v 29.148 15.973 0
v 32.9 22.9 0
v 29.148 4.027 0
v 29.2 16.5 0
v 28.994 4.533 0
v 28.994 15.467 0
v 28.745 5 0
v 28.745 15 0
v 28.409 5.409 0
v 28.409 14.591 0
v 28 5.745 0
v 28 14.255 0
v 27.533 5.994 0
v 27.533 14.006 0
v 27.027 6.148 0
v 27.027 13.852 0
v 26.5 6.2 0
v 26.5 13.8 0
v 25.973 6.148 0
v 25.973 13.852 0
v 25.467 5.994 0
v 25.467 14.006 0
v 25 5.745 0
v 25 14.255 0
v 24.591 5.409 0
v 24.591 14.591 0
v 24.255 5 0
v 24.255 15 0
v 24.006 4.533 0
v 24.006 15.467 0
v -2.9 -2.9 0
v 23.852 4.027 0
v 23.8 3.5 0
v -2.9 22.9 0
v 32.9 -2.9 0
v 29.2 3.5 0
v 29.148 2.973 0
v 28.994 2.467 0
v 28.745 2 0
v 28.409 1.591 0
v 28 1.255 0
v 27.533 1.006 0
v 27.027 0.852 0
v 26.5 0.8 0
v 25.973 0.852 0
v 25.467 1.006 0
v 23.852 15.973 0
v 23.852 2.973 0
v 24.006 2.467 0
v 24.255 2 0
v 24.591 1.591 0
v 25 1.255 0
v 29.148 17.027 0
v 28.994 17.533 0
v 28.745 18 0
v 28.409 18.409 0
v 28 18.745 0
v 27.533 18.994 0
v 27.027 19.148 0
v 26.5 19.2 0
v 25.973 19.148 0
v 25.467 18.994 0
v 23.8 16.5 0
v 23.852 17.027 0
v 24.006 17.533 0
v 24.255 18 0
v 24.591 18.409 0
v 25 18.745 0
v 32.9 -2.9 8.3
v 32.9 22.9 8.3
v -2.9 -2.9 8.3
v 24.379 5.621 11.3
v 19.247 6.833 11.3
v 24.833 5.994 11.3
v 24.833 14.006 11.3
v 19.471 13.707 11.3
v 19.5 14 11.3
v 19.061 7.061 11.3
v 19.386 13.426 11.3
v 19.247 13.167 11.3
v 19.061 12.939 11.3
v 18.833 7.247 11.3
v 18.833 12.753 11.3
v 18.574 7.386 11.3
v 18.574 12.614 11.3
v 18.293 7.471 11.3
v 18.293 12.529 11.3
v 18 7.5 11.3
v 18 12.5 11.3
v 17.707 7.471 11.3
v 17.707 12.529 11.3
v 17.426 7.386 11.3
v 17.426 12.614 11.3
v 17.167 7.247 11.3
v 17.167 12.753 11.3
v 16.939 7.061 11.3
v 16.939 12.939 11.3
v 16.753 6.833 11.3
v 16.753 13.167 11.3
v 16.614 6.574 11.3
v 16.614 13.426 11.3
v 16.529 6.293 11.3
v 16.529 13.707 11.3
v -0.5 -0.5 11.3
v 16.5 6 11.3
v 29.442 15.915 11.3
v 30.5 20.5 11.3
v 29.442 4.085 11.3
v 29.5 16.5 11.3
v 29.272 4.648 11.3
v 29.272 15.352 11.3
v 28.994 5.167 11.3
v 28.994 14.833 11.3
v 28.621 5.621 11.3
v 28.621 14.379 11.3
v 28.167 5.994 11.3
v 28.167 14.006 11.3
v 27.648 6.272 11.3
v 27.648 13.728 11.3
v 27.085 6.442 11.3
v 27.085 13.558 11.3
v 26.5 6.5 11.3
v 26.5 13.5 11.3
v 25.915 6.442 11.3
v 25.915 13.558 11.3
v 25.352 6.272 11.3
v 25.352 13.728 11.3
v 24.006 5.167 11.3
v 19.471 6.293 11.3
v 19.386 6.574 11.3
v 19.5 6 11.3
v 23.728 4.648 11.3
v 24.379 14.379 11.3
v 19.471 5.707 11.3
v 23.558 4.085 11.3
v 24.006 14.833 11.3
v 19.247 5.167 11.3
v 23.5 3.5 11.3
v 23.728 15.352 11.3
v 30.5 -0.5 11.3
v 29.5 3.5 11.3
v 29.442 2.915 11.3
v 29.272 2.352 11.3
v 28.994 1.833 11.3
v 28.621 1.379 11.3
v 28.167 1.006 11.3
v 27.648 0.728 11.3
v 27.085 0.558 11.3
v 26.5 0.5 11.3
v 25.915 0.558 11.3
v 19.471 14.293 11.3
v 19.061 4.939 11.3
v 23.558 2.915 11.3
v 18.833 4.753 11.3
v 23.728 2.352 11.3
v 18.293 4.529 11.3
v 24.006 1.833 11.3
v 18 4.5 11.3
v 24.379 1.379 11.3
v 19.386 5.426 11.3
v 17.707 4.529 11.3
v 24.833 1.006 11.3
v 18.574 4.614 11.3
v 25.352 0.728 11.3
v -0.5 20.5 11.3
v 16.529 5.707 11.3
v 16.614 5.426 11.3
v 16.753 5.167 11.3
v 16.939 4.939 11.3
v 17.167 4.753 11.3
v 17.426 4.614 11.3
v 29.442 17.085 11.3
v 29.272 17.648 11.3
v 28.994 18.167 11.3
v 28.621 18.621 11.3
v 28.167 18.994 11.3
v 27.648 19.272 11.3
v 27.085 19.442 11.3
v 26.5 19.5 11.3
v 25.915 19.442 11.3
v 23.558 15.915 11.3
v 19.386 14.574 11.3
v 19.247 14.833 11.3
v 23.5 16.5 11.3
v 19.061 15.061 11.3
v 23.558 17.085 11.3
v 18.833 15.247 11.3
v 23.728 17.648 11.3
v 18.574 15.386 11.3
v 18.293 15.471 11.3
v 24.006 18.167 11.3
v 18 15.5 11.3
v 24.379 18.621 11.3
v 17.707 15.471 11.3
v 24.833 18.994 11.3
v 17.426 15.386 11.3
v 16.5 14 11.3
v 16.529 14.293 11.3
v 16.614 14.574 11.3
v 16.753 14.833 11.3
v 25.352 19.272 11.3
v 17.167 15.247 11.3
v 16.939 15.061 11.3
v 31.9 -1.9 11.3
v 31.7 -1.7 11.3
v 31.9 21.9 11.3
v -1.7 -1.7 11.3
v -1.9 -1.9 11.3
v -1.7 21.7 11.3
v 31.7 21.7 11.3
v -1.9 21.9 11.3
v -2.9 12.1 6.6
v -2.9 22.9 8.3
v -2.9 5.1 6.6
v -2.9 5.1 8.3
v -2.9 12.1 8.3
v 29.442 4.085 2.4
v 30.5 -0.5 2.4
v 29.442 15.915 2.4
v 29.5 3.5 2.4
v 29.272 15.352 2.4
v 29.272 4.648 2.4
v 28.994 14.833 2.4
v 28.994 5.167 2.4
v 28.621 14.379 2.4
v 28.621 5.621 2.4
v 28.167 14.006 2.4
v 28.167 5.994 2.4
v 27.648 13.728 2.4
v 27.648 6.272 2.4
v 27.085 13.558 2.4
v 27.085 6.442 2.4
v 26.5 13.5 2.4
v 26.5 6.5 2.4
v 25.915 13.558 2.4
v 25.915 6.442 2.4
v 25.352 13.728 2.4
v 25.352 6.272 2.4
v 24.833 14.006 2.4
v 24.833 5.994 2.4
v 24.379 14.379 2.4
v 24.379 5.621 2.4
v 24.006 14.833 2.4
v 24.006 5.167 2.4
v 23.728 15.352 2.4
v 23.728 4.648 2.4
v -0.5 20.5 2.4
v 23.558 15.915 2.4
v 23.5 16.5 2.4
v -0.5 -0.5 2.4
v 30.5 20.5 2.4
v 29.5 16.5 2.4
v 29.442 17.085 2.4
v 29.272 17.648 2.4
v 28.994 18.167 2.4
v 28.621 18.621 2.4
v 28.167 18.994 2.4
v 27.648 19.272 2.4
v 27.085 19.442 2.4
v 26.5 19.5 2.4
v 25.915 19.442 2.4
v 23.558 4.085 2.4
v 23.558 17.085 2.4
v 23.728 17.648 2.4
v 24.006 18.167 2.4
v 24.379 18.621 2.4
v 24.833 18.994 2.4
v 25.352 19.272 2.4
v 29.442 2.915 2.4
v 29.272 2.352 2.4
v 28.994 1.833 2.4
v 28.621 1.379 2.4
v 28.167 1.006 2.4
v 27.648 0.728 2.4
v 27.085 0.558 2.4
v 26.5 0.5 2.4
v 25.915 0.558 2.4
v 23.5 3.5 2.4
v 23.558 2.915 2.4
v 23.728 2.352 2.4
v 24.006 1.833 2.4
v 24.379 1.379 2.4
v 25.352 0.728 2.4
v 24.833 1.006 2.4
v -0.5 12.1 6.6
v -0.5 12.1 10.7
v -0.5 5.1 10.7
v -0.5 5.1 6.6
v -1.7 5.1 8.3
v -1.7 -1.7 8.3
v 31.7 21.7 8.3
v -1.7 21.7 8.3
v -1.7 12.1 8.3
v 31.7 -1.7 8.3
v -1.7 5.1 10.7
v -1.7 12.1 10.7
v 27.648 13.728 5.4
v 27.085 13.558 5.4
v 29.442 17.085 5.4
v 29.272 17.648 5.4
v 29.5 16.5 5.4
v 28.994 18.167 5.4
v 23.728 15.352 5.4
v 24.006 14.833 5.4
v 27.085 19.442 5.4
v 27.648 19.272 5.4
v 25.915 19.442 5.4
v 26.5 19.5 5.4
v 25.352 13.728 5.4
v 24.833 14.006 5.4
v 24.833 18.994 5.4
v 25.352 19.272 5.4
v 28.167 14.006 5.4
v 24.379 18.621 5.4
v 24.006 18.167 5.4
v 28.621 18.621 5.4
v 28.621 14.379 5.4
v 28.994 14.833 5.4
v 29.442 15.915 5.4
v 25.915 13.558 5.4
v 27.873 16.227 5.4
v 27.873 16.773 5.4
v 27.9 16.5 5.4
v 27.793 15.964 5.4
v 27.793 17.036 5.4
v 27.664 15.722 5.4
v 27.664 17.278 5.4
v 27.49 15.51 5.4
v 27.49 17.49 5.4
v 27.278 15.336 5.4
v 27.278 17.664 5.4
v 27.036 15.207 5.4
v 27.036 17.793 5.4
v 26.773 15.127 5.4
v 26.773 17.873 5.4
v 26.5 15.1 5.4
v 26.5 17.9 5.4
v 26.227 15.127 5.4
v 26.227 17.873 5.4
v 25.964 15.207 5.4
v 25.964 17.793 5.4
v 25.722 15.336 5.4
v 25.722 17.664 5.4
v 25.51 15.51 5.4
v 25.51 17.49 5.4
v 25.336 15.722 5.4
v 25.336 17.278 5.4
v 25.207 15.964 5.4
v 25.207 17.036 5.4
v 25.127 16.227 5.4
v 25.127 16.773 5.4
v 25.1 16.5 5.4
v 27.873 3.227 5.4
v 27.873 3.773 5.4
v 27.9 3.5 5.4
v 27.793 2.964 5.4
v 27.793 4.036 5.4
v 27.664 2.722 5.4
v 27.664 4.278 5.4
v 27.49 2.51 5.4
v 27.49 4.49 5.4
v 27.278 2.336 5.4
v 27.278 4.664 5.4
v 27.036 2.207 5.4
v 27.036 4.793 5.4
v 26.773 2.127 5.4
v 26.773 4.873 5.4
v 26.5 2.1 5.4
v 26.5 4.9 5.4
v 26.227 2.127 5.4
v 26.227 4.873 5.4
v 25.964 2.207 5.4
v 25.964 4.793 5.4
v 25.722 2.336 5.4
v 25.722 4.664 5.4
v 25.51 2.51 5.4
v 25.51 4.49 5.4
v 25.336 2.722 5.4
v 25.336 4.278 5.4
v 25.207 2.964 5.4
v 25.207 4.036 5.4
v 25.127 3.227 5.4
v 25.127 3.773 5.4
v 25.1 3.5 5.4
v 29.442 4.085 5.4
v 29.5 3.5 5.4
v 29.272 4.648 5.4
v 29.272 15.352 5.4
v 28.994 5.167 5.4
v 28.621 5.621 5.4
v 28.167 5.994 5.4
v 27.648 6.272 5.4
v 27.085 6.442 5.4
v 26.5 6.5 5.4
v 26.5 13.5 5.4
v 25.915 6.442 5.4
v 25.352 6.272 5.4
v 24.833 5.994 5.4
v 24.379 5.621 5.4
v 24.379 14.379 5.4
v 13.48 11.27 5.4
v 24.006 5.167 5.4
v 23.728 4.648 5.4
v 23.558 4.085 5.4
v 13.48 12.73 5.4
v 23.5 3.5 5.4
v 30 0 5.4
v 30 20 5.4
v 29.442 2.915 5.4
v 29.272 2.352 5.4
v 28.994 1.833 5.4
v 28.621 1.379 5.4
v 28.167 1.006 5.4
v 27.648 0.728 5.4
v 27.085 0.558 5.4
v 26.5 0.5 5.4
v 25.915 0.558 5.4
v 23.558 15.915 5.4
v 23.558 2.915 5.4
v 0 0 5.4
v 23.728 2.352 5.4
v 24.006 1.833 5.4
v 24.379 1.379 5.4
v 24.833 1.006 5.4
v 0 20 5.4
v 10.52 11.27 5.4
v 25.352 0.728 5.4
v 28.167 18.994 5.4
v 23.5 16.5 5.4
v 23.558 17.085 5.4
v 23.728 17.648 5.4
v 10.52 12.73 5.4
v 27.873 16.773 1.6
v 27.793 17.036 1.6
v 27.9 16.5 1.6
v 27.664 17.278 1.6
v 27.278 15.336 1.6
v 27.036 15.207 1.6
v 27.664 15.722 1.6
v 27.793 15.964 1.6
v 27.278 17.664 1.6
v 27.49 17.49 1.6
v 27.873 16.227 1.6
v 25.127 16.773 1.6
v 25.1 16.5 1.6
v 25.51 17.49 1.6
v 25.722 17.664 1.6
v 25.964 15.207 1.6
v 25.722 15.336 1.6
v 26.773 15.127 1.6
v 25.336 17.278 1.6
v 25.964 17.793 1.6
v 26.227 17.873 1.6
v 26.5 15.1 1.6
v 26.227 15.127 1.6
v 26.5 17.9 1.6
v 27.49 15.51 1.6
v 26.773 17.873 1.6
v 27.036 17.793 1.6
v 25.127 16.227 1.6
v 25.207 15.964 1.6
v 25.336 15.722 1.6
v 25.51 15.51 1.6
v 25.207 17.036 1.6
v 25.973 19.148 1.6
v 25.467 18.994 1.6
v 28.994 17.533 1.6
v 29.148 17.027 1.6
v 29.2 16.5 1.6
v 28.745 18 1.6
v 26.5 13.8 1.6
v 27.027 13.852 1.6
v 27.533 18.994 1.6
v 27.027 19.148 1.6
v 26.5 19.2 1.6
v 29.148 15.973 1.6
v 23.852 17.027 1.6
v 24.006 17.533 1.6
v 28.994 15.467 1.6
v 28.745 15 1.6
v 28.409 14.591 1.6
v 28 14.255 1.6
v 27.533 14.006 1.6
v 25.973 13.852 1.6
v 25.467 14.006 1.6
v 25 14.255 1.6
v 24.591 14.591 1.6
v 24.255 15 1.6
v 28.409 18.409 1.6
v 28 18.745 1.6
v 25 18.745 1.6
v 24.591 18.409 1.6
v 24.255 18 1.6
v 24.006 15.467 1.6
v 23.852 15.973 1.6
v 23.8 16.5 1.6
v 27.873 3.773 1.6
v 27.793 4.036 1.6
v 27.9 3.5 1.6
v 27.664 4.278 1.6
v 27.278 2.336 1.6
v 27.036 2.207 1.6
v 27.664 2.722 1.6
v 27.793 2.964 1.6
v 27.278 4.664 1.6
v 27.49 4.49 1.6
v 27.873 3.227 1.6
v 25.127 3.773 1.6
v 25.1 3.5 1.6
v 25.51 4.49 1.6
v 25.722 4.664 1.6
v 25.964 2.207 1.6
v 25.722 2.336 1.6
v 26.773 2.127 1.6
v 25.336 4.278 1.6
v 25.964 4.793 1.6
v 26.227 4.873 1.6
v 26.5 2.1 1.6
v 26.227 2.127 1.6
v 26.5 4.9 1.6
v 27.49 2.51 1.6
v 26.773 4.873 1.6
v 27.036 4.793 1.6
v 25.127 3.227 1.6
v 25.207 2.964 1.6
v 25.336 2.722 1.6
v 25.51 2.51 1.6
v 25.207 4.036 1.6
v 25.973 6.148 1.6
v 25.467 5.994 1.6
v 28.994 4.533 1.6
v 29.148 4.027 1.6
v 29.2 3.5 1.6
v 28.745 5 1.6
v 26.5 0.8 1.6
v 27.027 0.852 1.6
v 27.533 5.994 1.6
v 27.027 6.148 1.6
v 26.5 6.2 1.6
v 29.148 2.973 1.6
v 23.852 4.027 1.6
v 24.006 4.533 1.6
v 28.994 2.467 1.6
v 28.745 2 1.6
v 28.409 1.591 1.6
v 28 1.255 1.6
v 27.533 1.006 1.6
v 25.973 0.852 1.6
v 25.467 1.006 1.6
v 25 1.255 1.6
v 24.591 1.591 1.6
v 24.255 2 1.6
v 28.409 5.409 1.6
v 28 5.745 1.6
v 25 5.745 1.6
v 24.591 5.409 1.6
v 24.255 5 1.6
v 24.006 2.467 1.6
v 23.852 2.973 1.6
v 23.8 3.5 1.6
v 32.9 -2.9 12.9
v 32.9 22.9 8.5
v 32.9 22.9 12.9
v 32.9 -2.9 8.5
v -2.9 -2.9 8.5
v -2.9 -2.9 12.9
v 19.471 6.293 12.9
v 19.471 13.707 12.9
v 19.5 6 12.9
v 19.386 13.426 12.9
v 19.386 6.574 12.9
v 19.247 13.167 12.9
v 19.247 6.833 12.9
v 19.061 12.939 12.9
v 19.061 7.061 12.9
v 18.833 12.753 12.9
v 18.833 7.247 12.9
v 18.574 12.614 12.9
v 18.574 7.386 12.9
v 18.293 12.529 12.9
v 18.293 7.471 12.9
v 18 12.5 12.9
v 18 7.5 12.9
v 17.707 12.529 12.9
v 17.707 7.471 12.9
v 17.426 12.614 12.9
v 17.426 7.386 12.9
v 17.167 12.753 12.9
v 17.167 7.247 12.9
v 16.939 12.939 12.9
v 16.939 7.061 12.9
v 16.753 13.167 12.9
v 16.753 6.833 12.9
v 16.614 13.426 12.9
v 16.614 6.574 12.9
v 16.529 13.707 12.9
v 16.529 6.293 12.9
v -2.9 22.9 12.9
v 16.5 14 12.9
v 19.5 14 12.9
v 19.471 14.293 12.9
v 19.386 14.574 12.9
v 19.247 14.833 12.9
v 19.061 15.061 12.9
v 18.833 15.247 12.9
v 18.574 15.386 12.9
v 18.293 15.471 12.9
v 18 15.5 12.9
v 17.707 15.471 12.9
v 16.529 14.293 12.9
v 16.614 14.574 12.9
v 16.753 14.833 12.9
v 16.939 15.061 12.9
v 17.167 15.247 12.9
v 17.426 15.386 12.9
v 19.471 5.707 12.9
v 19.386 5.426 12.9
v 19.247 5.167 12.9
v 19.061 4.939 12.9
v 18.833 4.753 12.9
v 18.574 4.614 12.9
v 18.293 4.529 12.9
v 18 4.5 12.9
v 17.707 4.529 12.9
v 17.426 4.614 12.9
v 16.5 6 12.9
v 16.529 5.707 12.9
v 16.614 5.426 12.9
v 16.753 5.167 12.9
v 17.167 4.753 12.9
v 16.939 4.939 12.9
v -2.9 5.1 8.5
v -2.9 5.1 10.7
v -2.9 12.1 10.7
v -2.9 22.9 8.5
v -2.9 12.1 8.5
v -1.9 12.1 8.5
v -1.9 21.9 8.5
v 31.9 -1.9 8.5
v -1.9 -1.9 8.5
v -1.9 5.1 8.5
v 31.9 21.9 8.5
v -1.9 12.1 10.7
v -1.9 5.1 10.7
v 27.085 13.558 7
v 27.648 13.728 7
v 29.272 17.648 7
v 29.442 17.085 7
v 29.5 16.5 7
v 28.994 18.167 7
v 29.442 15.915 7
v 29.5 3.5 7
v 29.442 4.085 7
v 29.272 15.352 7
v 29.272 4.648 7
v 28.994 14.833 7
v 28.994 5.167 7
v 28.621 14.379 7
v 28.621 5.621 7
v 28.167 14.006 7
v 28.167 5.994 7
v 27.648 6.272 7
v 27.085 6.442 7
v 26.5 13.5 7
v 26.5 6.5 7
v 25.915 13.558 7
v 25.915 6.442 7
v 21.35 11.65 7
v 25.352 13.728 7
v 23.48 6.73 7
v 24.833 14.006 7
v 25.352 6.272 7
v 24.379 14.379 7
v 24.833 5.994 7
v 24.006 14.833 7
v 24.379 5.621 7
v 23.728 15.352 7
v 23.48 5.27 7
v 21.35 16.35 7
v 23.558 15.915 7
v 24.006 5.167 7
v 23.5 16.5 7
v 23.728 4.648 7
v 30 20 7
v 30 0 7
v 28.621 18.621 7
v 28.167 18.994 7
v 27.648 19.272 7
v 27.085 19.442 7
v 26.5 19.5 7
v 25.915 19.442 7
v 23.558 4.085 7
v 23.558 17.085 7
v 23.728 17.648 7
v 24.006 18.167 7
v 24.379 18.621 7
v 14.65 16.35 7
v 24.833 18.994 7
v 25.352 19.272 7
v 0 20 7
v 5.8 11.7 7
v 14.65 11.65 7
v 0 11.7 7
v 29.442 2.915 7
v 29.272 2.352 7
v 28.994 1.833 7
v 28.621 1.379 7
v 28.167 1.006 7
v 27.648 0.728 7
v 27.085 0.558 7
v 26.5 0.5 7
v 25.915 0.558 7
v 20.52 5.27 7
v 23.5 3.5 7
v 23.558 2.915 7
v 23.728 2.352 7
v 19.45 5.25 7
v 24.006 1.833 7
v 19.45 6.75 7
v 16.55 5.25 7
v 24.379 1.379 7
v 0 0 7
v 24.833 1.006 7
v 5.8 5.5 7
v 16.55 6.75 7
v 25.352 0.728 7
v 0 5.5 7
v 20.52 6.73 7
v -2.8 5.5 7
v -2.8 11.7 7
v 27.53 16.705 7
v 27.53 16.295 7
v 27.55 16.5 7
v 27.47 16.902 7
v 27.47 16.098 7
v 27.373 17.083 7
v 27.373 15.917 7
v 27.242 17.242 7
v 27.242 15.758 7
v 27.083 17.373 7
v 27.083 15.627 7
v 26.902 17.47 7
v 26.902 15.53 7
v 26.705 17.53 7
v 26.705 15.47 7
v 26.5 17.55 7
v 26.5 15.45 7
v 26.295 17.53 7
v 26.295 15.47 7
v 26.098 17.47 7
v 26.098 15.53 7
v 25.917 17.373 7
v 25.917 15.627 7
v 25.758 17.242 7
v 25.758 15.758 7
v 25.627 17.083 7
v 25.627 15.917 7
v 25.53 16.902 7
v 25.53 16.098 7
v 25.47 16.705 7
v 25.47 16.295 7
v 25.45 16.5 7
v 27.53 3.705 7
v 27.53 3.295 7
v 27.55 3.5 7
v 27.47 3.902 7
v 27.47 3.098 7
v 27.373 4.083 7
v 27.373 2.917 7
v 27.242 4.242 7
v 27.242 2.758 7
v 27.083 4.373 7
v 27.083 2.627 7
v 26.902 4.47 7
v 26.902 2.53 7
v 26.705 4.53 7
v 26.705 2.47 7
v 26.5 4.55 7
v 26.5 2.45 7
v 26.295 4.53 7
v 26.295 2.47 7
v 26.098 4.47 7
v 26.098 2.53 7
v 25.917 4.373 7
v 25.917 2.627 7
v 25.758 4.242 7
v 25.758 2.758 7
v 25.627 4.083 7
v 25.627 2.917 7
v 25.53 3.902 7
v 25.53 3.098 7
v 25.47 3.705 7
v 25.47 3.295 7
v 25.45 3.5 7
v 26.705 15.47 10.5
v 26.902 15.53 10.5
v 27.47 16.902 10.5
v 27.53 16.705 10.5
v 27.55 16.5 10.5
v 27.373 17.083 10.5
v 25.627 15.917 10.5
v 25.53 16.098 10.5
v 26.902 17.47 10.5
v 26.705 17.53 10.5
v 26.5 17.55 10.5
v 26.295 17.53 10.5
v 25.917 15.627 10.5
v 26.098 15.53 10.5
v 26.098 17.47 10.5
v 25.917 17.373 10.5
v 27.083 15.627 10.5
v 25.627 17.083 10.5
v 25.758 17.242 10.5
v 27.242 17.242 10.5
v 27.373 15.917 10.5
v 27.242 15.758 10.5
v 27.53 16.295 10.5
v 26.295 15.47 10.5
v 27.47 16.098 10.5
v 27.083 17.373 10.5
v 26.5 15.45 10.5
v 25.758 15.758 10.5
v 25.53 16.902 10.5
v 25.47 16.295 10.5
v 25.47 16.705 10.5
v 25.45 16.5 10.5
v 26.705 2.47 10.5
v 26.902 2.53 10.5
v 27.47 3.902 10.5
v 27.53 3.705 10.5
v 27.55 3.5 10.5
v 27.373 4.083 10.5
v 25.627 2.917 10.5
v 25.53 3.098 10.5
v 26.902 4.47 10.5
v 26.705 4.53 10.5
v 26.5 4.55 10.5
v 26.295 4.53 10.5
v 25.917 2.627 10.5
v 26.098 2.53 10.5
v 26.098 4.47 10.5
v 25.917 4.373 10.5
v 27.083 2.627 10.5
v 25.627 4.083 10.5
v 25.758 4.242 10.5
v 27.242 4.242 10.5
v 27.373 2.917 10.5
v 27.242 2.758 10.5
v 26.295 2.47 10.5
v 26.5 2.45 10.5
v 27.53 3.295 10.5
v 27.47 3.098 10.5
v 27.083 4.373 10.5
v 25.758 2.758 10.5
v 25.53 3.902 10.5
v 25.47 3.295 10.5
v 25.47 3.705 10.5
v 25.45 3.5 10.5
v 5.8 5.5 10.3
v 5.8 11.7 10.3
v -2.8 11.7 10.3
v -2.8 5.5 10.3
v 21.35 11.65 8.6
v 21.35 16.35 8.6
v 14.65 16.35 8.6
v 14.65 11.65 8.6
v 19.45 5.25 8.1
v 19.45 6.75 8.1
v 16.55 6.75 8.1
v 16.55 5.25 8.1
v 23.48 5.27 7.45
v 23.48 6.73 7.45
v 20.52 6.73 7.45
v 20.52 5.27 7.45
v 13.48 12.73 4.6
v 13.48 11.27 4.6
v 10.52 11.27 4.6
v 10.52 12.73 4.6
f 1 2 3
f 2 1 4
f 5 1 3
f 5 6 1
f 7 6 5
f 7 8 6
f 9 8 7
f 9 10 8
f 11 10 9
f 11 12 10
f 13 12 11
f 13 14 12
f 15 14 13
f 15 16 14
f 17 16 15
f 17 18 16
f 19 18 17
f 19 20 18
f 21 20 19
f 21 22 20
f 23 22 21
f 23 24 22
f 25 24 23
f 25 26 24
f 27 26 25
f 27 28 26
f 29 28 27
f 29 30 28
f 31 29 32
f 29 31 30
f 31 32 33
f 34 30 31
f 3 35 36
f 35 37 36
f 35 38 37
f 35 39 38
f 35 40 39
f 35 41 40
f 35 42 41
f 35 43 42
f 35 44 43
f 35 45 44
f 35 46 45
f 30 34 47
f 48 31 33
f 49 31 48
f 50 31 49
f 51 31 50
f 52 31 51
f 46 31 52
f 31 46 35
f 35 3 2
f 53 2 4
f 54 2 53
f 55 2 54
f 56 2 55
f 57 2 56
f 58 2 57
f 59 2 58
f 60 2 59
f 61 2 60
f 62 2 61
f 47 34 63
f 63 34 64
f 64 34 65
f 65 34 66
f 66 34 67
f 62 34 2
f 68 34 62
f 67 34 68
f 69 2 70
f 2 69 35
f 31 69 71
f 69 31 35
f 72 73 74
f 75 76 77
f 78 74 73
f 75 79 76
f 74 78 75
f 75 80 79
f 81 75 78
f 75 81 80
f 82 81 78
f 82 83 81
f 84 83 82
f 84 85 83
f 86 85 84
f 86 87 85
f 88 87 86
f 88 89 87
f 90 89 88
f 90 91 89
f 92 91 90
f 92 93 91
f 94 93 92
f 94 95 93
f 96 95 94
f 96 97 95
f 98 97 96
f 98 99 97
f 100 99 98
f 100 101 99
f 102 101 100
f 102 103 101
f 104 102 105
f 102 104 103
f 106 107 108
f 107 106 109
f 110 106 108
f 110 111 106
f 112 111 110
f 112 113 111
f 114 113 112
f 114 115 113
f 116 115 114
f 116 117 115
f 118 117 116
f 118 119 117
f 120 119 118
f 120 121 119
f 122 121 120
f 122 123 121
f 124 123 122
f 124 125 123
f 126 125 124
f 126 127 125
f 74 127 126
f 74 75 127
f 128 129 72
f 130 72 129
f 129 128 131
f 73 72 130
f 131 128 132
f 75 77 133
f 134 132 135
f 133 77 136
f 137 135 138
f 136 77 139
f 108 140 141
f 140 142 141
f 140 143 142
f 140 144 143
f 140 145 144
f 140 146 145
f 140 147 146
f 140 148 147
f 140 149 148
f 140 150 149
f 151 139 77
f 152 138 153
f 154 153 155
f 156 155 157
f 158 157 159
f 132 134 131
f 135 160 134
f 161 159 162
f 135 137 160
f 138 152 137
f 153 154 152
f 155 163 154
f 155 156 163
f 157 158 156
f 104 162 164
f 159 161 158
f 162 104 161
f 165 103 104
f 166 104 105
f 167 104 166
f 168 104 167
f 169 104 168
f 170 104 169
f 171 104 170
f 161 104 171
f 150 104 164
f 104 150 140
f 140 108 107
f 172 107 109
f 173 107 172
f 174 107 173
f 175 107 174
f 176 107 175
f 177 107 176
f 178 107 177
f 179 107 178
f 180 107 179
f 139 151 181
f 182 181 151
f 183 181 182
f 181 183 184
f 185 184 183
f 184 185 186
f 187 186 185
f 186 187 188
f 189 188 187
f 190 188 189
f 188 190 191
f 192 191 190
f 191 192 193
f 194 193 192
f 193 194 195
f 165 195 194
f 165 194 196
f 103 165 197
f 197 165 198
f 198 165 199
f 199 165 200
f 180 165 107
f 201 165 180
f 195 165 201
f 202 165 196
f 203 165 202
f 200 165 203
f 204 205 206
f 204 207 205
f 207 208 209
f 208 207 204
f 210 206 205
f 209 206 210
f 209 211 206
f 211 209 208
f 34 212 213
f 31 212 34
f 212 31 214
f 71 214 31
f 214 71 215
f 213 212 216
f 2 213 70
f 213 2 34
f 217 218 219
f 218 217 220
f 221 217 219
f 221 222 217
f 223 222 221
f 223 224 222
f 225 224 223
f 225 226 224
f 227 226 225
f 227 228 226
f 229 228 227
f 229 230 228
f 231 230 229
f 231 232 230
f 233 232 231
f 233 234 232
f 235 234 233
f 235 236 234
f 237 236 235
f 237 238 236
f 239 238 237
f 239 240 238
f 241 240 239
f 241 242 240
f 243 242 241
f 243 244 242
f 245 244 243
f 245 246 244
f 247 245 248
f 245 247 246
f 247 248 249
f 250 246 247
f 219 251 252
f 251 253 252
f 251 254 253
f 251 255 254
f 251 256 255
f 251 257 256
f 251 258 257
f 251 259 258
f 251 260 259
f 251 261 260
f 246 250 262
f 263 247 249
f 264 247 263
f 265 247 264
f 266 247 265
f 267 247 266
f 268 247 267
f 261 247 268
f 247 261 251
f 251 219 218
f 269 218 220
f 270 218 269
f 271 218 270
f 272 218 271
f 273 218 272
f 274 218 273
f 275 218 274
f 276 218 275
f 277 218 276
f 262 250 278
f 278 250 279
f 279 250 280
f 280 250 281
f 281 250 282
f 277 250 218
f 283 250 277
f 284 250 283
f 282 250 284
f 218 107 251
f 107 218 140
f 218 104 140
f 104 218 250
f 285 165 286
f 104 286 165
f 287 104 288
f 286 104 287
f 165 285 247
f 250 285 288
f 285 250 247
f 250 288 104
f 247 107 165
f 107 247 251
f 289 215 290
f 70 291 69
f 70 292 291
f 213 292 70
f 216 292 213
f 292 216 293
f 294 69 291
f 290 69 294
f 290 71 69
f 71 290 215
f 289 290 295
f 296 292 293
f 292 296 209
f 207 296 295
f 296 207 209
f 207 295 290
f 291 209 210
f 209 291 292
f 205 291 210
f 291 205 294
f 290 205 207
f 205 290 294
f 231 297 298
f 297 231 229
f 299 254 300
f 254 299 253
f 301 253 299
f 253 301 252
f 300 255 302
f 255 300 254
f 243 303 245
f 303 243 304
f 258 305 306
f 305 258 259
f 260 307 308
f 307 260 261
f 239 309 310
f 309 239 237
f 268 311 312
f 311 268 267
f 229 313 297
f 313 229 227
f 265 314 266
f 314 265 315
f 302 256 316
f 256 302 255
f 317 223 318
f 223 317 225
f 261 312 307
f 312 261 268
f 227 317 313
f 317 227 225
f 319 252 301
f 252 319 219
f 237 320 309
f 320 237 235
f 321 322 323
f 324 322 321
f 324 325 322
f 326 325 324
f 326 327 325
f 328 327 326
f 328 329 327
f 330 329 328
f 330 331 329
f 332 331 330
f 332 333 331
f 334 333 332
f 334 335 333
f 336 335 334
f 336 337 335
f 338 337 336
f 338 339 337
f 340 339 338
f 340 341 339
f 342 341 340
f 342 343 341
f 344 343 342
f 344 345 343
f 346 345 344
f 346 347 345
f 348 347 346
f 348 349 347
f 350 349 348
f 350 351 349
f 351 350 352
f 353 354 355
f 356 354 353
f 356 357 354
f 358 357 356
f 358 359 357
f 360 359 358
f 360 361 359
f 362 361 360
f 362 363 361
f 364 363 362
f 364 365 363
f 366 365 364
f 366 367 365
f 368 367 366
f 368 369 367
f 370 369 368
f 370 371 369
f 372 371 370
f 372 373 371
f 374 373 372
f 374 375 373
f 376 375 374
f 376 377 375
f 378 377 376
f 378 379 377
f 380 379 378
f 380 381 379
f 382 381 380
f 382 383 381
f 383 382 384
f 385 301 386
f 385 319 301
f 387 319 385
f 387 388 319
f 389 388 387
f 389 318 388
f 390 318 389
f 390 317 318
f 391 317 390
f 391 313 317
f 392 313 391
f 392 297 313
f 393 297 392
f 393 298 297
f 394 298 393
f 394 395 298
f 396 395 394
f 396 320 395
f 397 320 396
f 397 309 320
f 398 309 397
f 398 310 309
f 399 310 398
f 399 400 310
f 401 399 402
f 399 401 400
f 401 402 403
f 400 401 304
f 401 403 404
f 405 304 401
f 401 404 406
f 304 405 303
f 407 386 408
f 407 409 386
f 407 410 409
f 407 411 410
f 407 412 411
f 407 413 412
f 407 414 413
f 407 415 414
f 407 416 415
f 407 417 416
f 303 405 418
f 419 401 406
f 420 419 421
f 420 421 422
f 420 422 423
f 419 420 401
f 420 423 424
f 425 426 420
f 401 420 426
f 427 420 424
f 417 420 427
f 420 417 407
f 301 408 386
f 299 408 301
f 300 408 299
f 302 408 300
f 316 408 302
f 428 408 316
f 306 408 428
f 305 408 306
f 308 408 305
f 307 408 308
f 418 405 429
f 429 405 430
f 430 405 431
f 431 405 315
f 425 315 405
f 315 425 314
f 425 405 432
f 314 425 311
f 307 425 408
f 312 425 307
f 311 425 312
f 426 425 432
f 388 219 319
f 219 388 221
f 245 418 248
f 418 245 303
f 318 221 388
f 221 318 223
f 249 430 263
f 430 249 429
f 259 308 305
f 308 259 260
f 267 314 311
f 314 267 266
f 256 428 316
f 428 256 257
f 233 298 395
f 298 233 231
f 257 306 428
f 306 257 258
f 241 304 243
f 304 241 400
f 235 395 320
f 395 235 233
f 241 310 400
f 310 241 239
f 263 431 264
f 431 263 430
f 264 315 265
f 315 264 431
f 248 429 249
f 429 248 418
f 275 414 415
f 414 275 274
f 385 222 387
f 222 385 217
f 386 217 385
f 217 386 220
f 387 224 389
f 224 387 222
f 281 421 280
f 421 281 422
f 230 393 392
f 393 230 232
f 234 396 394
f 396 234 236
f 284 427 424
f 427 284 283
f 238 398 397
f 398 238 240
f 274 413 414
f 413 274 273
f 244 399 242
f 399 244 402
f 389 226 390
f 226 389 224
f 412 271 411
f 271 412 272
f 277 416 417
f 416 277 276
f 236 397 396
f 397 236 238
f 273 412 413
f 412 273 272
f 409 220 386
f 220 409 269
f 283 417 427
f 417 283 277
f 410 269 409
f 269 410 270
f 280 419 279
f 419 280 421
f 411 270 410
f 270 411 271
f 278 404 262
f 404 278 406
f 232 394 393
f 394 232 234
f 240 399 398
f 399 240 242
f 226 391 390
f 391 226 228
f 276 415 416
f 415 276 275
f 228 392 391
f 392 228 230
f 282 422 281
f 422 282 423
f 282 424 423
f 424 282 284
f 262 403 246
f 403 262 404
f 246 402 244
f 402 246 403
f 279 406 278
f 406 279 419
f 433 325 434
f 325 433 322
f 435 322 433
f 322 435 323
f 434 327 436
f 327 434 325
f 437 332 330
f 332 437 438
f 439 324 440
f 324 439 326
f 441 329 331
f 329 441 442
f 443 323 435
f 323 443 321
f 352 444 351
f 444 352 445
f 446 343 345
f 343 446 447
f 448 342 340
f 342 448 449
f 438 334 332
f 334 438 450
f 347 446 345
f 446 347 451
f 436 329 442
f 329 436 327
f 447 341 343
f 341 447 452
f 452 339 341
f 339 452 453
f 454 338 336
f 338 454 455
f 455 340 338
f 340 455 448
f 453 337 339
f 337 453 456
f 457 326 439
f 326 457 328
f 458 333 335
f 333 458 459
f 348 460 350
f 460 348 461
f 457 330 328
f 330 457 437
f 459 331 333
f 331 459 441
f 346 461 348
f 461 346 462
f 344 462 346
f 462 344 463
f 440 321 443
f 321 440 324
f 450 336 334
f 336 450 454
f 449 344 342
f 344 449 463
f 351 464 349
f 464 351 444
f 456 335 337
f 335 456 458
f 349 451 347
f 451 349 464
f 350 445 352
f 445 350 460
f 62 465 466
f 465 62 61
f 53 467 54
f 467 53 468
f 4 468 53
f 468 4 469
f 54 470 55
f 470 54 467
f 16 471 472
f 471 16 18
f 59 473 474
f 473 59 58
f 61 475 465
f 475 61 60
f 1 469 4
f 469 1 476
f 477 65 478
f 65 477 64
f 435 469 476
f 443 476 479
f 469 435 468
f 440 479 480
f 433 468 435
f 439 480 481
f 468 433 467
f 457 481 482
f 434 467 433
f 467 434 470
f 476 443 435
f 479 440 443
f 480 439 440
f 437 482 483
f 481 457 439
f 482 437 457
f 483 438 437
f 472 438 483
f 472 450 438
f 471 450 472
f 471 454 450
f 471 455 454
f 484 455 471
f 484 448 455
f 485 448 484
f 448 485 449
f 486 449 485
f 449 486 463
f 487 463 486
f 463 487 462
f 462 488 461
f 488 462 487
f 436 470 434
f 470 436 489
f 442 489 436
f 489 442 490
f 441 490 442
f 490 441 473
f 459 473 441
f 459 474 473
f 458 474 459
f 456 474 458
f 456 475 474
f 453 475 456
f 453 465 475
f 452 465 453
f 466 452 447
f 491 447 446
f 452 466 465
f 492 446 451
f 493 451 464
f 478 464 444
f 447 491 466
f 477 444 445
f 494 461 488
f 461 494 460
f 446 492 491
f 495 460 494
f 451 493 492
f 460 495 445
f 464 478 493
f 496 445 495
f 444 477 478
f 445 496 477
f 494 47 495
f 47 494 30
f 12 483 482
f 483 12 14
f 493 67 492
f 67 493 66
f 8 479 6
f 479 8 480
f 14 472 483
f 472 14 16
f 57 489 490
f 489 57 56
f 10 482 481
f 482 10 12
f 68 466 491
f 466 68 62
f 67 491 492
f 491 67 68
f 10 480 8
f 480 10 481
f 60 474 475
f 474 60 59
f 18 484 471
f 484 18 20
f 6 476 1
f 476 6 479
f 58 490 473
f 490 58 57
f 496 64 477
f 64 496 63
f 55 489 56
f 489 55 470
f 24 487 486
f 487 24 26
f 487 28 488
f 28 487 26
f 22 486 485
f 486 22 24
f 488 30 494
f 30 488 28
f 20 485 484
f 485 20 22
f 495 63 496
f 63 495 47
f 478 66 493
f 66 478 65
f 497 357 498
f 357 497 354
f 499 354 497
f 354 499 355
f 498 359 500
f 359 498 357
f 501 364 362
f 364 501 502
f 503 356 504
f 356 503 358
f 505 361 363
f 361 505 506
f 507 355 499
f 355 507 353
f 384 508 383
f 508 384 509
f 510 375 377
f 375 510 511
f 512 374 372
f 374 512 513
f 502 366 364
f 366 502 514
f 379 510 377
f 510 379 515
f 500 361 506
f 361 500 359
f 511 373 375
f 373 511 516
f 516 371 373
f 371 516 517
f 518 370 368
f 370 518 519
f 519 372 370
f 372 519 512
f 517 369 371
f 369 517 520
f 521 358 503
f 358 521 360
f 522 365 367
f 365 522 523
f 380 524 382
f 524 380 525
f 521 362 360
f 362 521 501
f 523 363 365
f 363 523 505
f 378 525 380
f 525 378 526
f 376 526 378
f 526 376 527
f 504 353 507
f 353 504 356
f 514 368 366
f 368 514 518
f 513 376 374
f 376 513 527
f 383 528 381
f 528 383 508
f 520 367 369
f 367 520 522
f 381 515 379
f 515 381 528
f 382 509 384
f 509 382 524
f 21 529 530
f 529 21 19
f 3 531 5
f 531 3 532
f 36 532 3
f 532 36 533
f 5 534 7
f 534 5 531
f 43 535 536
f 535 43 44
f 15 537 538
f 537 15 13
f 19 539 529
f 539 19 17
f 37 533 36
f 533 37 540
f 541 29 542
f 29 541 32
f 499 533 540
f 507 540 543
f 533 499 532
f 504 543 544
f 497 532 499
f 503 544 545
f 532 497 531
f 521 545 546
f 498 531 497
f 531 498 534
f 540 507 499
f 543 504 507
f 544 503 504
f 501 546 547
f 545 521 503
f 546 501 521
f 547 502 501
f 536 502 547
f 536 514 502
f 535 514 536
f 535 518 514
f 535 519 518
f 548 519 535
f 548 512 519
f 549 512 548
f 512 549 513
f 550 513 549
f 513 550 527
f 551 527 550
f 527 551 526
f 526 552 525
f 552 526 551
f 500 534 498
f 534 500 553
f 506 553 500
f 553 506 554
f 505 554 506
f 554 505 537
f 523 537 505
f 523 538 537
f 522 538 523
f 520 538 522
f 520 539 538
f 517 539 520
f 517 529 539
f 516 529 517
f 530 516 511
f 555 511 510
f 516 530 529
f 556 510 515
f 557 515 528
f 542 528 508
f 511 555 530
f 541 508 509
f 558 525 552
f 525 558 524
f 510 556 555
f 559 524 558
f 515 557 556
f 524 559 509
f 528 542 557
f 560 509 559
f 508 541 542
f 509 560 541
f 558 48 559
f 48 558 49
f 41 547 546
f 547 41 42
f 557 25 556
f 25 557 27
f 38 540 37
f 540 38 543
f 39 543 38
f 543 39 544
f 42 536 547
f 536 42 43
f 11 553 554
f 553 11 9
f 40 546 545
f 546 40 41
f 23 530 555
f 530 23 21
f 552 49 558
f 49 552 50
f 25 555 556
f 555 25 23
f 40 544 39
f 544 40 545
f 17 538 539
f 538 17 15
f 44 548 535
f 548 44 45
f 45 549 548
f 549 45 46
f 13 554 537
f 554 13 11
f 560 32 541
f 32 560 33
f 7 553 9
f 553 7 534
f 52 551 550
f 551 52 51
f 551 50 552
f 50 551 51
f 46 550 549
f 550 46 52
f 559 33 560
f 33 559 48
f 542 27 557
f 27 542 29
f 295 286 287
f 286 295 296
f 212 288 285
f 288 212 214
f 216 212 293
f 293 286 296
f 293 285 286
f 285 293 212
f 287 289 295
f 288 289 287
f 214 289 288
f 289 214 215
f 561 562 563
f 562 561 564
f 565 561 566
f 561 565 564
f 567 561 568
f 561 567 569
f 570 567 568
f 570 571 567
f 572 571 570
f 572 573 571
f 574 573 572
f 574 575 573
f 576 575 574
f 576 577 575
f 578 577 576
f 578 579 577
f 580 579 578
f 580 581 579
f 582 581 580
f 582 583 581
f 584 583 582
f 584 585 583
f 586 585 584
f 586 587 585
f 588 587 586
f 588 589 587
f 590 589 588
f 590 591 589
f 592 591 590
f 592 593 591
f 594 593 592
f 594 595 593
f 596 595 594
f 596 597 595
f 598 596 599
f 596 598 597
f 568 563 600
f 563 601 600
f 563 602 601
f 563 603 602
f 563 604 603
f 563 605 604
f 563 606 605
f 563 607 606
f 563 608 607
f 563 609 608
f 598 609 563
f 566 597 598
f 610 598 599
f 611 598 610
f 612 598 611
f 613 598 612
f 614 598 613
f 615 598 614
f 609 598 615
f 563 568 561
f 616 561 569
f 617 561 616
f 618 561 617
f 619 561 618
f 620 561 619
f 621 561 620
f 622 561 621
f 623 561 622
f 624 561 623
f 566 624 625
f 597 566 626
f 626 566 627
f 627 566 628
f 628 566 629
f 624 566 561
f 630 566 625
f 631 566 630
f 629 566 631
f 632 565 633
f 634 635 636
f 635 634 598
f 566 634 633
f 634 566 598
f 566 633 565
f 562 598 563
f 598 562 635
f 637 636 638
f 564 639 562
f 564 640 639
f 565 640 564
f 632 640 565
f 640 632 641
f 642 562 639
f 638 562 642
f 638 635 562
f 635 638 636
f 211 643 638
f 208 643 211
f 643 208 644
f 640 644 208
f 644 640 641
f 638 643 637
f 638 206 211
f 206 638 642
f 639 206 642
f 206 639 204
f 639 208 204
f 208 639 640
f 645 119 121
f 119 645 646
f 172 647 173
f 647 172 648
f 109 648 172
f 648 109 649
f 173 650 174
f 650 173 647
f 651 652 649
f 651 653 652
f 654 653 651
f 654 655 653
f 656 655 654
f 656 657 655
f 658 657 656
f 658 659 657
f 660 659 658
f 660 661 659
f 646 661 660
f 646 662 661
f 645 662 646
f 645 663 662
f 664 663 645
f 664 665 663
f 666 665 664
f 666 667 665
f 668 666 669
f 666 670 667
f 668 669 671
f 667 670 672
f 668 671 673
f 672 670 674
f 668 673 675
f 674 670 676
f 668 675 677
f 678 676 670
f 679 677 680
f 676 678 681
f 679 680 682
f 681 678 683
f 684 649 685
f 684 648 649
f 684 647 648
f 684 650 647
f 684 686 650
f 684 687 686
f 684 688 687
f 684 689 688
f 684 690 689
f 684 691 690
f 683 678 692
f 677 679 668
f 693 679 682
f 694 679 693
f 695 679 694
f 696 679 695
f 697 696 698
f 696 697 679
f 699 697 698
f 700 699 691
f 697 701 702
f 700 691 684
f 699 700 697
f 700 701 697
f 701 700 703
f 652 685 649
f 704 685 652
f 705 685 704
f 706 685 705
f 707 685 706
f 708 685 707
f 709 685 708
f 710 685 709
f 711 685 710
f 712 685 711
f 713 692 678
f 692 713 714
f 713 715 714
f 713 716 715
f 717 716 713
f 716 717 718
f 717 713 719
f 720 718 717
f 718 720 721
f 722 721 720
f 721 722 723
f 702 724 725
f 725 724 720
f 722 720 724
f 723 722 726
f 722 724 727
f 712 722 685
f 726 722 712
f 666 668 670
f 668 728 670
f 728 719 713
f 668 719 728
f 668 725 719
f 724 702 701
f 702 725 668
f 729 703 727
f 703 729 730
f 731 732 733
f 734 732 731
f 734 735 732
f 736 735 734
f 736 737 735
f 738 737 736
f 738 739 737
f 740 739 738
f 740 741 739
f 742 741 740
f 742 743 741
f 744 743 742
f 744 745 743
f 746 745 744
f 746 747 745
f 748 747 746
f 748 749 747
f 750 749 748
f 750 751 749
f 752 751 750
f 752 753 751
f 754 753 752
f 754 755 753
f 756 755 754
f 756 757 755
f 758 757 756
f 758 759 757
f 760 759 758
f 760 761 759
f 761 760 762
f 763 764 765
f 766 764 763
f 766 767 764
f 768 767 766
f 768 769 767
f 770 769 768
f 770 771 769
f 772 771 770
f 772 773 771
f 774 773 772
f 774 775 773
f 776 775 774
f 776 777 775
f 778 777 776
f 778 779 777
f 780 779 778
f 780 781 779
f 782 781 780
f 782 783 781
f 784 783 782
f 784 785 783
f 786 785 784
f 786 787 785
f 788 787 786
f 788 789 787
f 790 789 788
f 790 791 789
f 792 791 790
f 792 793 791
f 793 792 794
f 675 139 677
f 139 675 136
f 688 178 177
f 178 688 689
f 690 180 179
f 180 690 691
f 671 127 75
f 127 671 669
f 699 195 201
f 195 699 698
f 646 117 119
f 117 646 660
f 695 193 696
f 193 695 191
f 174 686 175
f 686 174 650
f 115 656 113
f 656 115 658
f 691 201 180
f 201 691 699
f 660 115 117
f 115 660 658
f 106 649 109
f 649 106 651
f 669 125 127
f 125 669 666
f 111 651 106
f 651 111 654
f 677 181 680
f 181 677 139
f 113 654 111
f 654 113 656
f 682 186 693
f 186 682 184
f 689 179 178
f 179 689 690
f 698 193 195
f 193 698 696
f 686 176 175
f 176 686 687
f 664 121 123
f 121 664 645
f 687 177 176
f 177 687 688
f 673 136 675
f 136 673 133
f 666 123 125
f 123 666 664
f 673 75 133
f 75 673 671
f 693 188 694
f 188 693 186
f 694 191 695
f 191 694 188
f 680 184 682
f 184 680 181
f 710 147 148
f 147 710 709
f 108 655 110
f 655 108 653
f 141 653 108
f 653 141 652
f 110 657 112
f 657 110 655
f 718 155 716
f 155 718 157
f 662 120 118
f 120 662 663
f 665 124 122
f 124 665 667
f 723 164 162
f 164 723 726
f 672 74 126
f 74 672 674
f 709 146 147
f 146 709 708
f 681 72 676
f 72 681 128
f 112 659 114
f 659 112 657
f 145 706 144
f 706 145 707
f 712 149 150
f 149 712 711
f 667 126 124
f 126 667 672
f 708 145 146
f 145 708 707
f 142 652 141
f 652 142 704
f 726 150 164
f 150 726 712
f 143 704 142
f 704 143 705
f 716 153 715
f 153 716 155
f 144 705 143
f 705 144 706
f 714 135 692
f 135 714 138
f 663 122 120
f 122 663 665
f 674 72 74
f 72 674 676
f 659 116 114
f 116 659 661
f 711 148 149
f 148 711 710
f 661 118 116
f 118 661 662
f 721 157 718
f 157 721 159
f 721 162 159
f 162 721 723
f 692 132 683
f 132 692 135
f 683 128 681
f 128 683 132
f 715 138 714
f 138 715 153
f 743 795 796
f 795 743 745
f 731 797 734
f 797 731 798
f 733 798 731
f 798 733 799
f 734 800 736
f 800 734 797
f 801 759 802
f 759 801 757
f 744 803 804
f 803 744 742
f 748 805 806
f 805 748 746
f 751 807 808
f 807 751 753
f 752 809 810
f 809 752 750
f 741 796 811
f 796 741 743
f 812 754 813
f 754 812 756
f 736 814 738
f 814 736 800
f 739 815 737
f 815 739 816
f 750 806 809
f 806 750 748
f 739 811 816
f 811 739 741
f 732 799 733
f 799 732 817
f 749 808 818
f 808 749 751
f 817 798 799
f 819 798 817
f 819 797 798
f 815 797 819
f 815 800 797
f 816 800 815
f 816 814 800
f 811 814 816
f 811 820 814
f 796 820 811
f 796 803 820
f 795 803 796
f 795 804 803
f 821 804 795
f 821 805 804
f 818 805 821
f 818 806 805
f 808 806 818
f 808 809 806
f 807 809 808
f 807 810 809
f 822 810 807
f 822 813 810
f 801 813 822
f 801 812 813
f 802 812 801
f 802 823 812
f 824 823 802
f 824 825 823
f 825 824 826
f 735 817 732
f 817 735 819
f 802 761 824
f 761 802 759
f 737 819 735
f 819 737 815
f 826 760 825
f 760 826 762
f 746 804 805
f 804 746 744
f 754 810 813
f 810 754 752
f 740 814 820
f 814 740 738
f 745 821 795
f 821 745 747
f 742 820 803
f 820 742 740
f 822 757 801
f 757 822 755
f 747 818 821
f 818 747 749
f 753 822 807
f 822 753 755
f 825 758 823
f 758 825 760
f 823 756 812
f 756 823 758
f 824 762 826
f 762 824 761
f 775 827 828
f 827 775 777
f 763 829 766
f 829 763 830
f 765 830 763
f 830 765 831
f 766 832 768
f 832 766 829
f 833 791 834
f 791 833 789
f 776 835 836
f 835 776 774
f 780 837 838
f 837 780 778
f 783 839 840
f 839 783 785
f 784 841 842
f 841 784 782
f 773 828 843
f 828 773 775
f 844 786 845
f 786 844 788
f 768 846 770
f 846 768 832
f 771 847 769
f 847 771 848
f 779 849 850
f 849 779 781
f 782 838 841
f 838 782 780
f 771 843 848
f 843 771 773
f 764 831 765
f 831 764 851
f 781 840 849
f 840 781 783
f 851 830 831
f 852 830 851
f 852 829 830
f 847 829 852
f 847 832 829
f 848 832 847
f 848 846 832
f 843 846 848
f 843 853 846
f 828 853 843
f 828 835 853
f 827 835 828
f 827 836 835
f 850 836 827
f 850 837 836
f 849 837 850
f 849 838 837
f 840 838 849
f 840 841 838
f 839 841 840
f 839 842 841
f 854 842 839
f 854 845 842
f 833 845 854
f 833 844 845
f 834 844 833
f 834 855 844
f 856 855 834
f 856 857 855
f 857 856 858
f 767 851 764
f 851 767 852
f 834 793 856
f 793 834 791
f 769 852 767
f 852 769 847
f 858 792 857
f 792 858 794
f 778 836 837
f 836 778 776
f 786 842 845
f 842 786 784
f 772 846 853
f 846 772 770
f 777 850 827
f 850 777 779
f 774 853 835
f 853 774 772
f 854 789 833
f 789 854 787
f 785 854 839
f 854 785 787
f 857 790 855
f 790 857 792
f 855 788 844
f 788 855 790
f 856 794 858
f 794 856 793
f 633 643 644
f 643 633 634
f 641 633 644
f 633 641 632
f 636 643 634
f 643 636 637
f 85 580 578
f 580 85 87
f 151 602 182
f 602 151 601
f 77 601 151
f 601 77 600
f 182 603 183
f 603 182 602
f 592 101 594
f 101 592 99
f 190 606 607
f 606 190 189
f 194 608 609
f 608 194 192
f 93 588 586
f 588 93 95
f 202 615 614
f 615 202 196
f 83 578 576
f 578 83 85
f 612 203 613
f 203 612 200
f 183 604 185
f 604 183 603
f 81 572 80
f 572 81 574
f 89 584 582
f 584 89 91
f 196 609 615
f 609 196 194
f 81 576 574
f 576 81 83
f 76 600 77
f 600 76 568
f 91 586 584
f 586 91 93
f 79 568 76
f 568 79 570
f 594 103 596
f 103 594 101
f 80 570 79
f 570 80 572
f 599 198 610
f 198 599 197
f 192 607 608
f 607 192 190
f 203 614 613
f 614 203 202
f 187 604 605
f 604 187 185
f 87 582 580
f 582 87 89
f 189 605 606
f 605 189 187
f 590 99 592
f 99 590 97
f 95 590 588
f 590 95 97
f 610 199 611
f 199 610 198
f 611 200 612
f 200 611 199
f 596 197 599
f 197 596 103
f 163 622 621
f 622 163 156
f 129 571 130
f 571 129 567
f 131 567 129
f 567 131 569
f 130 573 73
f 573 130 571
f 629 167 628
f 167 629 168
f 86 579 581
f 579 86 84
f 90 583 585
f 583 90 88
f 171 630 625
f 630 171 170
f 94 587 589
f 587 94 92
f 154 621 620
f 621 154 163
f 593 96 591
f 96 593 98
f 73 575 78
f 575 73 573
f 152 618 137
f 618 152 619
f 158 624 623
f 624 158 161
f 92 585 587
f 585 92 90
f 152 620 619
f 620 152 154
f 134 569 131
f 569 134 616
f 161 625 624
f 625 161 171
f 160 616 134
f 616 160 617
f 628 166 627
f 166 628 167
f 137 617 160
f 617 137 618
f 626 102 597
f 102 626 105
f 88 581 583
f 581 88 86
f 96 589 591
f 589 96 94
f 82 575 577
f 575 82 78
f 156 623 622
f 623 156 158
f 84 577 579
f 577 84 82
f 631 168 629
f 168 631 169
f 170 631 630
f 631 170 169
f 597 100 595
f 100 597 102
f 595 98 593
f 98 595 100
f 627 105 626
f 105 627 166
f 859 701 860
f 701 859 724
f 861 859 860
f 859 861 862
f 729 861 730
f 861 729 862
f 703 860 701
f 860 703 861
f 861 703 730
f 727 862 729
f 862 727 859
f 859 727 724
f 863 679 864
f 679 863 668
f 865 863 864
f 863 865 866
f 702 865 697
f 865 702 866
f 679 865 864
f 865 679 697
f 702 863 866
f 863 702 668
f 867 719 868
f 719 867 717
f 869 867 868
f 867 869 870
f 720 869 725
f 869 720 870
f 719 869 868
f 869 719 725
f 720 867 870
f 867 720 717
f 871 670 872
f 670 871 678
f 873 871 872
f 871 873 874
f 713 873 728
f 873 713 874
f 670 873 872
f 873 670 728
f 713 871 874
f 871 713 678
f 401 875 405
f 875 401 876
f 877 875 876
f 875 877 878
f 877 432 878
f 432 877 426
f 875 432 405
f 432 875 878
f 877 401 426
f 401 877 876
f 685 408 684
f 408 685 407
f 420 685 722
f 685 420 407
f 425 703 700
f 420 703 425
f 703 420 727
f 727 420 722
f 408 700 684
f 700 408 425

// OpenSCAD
// file: usbc_screwed_lid.scad
// The lid of the housing "usbc_screwed", written by enclosure-nv 0.1.0
// from the board file usbc_board.kicad_pcb.  Render with OpenSCAD.
// Parameters, in millimetres.  The same block heads every file of this housing:
// when a value is changed, change it in each file.
wall = 2.4;
floor_t = 2.4;
lid_t = 1.6;
clear = 0.5;  // the board's edge to the inside of the wall
standoff_d = 6;
screw_d = 2.5;
pilot_d = 2.1;
head_d = 5;
head_h = 1.6;
lip_h = 3;  // the height of the step the lid sits on
lid_gap = 0.2;
snap_depth = 0.4;
snap_h = 0.8;
led_d = 3;
button_d = 3;
board_t = 1.6;
standoff_h = 3;  // the space under the board
top_space = 4.3;  // the space above the board
pilot_len = 3.5;  // the depth of the screw's hole
print_flip = false;  // true lays the lid plate down

// Levels along z.
z_bb = floor_t + standoff_h;
z_bt = z_bb + board_t;
z_split = z_bt + top_space;
z_step = z_split - lip_h;
z_top = z_split + lid_t;
z_skirt = z_step + lid_gap;
a_in = wall / 2;
screw_clear = screw_d + 0.3;

module outline() {
  polygon(points = [[0, 0], [30, 0], [30, 20], [0, 20]]);
}

module lid() {
  difference() {
    union() {
      // the plate
      translate([0, 0, z_split]) linear_extrude(height = lid_t) offset(delta = clear + wall) outline();
      // the skirt that takes the place of the outer half of the wall
      translate([0, 0, z_skirt]) linear_extrude(height = z_split - z_skirt + 0.2) difference() {
        offset(delta = clear + wall) outline();
        offset(delta = clear + a_in + lid_gap) outline();
      }
      // the pillars the screws turn into
      translate([26.5, 16.5, z_bt]) cylinder(h = z_split - z_bt + 0.2, d = standoff_d, $fn = 32);
      translate([26.5, 3.5, z_bt]) cylinder(h = z_split - z_bt + 0.2, d = standoff_d, $fn = 32);
    }
    // the screws' holes
    translate([26.5, 16.5, z_bt - 1]) cylinder(h = pilot_len + 1, d = pilot_d, $fn = 32);
    translate([26.5, 3.5, z_bt - 1]) cylinder(h = pilot_len + 1, d = pilot_d, $fn = 32);
    // the openings
    translate([0, 8.6, z_bt + (-0.4)]) rotate([0, 0, 180]) translate([-1, -3.5, 0]) cube([clear + wall + 2, 7, 4.1]);
    translate([18, 14, z_split - 1]) cylinder(h = lid_t + 2, d = 3, $fn = 32);
    translate([18, 6, z_split - 1]) cylinder(h = lid_t + 2, d = 3, $fn = 32);
  }
}

if (print_flip) {
  translate([0, 20, z_top]) rotate([180, 0, 0]) lid();
} else {
  lid();
}
// file: usbc_screwed_base.scad
// The base of the housing "usbc_screwed", written by enclosure-nv 0.1.0
// from the board file usbc_board.kicad_pcb.  Render with OpenSCAD.
// Parameters, in millimetres.  The same block heads every file of this housing:
// when a value is changed, change it in each file.
wall = 2.4;
floor_t = 2.4;
lid_t = 1.6;
clear = 0.5;  // the board's edge to the inside of the wall
standoff_d = 6;
screw_d = 2.5;
pilot_d = 2.1;
head_d = 5;
head_h = 1.6;
lip_h = 3;  // the height of the step the lid sits on
lid_gap = 0.2;
snap_depth = 0.4;
snap_h = 0.8;
led_d = 3;
button_d = 3;
board_t = 1.6;
standoff_h = 3;  // the space under the board
top_space = 4.3;  // the space above the board
pilot_len = 3.5;  // the depth of the screw's hole
print_flip = false;  // true lays the lid plate down

// Levels along z.
z_bb = floor_t + standoff_h;
z_bt = z_bb + board_t;
z_split = z_bt + top_space;
z_step = z_split - lip_h;
z_top = z_split + lid_t;
z_skirt = z_step + lid_gap;
a_in = wall / 2;
screw_clear = screw_d + 0.3;

module outline() {
  polygon(points = [[0, 0], [30, 0], [30, 20], [0, 20]]);
}

module base() {
  difference() {
    union() {
      difference() {
        linear_extrude(height = z_split) offset(delta = clear + wall) outline();
        translate([0, 0, floor_t]) linear_extrude(height = z_split) offset(delta = clear) outline();
        translate([0, 0, z_step]) linear_extrude(height = z_split) difference() {
          offset(delta = clear + wall + 1) outline();
          offset(delta = clear + a_in) outline();
        }
      }
      // the standoffs
      translate([26.5, 16.5, floor_t / 2]) cylinder(h = z_bb - floor_t / 2, d = standoff_d, $fn = 32);
      translate([26.5, 3.5, floor_t / 2]) cylinder(h = z_bb - floor_t / 2, d = standoff_d, $fn = 32);
    }
    // the screw holes, through the standoff and the floor, with a recess for the head
    translate([26.5, 16.5, -1]) cylinder(h = z_bb + 2, d = screw_clear, $fn = 32);
    translate([26.5, 16.5, -1]) cylinder(h = head_h + 1, d = head_d + 0.4, $fn = 32);
    translate([26.5, 3.5, -1]) cylinder(h = z_bb + 2, d = screw_clear, $fn = 32);
    translate([26.5, 3.5, -1]) cylinder(h = head_h + 1, d = head_d + 0.4, $fn = 32);
    // the openings
    translate([0, 8.6, z_bt + (-0.4)]) rotate([0, 0, 180]) translate([-1, -3.5, 0]) cube([clear + wall + 2, 7, 4.1]);
  }
}

base();
// main file
// The assembly of the housing "usbc_screwed", written by enclosure-nv 0.1.0
// from the board file usbc_board.kicad_pcb.  Render with OpenSCAD.
// Parameters, in millimetres.  The same block heads every file of this housing:
// when a value is changed, change it in each file.
wall = 2.4;
floor_t = 2.4;
lid_t = 1.6;
clear = 0.5;  // the board's edge to the inside of the wall
standoff_d = 6;
screw_d = 2.5;
pilot_d = 2.1;
head_d = 5;
head_h = 1.6;
lip_h = 3;  // the height of the step the lid sits on
lid_gap = 0.2;
snap_depth = 0.4;
snap_h = 0.8;
led_d = 3;
button_d = 3;
board_t = 1.6;
standoff_h = 3;  // the space under the board
top_space = 4.3;  // the space above the board
pilot_len = 3.5;  // the depth of the screw's hole
print_flip = false;  // true lays the lid plate down

// Levels along z.
z_bb = floor_t + standoff_h;
z_bt = z_bb + board_t;
z_split = z_bt + top_space;
z_step = z_split - lip_h;
z_top = z_split + lid_t;
z_skirt = z_step + lid_gap;
a_in = wall / 2;
screw_clear = screw_d + 0.3;

use <usbc_screwed_base.scad>
use <usbc_screwed_lid.scad>

module board_outline() {
  polygon(points = [[0, 0], [30, 0], [30, 20], [0, 20]]);
}

module board() {
  color([0.1, 0.55, 0.25, 0.8]) translate([0, 0, z_bb]) linear_extrude(height = board_t) difference() {
    board_outline();
  }
}

module parts() {
  color([0.75, 0.75, 0.75, 0.9]) {
    translate([-2.8, 5.5, 7]) cube([8.6, 6.2, 3.3]);  // J1
    translate([14.65, 11.65, 7]) cube([6.7, 4.7, 1.6]);  // SW1
    translate([16.55, 5.25, 7]) cube([2.9, 1.5, 1.1]);  // D1
    translate([20.52, 5.27, 7]) cube([2.96, 1.46, 0.45]);  // R1
    translate([10.52, 11.27, 4.6]) cube([2.96, 1.46, 0.8]);  // C1
  }
}

base();
lid();
board();
parts();
